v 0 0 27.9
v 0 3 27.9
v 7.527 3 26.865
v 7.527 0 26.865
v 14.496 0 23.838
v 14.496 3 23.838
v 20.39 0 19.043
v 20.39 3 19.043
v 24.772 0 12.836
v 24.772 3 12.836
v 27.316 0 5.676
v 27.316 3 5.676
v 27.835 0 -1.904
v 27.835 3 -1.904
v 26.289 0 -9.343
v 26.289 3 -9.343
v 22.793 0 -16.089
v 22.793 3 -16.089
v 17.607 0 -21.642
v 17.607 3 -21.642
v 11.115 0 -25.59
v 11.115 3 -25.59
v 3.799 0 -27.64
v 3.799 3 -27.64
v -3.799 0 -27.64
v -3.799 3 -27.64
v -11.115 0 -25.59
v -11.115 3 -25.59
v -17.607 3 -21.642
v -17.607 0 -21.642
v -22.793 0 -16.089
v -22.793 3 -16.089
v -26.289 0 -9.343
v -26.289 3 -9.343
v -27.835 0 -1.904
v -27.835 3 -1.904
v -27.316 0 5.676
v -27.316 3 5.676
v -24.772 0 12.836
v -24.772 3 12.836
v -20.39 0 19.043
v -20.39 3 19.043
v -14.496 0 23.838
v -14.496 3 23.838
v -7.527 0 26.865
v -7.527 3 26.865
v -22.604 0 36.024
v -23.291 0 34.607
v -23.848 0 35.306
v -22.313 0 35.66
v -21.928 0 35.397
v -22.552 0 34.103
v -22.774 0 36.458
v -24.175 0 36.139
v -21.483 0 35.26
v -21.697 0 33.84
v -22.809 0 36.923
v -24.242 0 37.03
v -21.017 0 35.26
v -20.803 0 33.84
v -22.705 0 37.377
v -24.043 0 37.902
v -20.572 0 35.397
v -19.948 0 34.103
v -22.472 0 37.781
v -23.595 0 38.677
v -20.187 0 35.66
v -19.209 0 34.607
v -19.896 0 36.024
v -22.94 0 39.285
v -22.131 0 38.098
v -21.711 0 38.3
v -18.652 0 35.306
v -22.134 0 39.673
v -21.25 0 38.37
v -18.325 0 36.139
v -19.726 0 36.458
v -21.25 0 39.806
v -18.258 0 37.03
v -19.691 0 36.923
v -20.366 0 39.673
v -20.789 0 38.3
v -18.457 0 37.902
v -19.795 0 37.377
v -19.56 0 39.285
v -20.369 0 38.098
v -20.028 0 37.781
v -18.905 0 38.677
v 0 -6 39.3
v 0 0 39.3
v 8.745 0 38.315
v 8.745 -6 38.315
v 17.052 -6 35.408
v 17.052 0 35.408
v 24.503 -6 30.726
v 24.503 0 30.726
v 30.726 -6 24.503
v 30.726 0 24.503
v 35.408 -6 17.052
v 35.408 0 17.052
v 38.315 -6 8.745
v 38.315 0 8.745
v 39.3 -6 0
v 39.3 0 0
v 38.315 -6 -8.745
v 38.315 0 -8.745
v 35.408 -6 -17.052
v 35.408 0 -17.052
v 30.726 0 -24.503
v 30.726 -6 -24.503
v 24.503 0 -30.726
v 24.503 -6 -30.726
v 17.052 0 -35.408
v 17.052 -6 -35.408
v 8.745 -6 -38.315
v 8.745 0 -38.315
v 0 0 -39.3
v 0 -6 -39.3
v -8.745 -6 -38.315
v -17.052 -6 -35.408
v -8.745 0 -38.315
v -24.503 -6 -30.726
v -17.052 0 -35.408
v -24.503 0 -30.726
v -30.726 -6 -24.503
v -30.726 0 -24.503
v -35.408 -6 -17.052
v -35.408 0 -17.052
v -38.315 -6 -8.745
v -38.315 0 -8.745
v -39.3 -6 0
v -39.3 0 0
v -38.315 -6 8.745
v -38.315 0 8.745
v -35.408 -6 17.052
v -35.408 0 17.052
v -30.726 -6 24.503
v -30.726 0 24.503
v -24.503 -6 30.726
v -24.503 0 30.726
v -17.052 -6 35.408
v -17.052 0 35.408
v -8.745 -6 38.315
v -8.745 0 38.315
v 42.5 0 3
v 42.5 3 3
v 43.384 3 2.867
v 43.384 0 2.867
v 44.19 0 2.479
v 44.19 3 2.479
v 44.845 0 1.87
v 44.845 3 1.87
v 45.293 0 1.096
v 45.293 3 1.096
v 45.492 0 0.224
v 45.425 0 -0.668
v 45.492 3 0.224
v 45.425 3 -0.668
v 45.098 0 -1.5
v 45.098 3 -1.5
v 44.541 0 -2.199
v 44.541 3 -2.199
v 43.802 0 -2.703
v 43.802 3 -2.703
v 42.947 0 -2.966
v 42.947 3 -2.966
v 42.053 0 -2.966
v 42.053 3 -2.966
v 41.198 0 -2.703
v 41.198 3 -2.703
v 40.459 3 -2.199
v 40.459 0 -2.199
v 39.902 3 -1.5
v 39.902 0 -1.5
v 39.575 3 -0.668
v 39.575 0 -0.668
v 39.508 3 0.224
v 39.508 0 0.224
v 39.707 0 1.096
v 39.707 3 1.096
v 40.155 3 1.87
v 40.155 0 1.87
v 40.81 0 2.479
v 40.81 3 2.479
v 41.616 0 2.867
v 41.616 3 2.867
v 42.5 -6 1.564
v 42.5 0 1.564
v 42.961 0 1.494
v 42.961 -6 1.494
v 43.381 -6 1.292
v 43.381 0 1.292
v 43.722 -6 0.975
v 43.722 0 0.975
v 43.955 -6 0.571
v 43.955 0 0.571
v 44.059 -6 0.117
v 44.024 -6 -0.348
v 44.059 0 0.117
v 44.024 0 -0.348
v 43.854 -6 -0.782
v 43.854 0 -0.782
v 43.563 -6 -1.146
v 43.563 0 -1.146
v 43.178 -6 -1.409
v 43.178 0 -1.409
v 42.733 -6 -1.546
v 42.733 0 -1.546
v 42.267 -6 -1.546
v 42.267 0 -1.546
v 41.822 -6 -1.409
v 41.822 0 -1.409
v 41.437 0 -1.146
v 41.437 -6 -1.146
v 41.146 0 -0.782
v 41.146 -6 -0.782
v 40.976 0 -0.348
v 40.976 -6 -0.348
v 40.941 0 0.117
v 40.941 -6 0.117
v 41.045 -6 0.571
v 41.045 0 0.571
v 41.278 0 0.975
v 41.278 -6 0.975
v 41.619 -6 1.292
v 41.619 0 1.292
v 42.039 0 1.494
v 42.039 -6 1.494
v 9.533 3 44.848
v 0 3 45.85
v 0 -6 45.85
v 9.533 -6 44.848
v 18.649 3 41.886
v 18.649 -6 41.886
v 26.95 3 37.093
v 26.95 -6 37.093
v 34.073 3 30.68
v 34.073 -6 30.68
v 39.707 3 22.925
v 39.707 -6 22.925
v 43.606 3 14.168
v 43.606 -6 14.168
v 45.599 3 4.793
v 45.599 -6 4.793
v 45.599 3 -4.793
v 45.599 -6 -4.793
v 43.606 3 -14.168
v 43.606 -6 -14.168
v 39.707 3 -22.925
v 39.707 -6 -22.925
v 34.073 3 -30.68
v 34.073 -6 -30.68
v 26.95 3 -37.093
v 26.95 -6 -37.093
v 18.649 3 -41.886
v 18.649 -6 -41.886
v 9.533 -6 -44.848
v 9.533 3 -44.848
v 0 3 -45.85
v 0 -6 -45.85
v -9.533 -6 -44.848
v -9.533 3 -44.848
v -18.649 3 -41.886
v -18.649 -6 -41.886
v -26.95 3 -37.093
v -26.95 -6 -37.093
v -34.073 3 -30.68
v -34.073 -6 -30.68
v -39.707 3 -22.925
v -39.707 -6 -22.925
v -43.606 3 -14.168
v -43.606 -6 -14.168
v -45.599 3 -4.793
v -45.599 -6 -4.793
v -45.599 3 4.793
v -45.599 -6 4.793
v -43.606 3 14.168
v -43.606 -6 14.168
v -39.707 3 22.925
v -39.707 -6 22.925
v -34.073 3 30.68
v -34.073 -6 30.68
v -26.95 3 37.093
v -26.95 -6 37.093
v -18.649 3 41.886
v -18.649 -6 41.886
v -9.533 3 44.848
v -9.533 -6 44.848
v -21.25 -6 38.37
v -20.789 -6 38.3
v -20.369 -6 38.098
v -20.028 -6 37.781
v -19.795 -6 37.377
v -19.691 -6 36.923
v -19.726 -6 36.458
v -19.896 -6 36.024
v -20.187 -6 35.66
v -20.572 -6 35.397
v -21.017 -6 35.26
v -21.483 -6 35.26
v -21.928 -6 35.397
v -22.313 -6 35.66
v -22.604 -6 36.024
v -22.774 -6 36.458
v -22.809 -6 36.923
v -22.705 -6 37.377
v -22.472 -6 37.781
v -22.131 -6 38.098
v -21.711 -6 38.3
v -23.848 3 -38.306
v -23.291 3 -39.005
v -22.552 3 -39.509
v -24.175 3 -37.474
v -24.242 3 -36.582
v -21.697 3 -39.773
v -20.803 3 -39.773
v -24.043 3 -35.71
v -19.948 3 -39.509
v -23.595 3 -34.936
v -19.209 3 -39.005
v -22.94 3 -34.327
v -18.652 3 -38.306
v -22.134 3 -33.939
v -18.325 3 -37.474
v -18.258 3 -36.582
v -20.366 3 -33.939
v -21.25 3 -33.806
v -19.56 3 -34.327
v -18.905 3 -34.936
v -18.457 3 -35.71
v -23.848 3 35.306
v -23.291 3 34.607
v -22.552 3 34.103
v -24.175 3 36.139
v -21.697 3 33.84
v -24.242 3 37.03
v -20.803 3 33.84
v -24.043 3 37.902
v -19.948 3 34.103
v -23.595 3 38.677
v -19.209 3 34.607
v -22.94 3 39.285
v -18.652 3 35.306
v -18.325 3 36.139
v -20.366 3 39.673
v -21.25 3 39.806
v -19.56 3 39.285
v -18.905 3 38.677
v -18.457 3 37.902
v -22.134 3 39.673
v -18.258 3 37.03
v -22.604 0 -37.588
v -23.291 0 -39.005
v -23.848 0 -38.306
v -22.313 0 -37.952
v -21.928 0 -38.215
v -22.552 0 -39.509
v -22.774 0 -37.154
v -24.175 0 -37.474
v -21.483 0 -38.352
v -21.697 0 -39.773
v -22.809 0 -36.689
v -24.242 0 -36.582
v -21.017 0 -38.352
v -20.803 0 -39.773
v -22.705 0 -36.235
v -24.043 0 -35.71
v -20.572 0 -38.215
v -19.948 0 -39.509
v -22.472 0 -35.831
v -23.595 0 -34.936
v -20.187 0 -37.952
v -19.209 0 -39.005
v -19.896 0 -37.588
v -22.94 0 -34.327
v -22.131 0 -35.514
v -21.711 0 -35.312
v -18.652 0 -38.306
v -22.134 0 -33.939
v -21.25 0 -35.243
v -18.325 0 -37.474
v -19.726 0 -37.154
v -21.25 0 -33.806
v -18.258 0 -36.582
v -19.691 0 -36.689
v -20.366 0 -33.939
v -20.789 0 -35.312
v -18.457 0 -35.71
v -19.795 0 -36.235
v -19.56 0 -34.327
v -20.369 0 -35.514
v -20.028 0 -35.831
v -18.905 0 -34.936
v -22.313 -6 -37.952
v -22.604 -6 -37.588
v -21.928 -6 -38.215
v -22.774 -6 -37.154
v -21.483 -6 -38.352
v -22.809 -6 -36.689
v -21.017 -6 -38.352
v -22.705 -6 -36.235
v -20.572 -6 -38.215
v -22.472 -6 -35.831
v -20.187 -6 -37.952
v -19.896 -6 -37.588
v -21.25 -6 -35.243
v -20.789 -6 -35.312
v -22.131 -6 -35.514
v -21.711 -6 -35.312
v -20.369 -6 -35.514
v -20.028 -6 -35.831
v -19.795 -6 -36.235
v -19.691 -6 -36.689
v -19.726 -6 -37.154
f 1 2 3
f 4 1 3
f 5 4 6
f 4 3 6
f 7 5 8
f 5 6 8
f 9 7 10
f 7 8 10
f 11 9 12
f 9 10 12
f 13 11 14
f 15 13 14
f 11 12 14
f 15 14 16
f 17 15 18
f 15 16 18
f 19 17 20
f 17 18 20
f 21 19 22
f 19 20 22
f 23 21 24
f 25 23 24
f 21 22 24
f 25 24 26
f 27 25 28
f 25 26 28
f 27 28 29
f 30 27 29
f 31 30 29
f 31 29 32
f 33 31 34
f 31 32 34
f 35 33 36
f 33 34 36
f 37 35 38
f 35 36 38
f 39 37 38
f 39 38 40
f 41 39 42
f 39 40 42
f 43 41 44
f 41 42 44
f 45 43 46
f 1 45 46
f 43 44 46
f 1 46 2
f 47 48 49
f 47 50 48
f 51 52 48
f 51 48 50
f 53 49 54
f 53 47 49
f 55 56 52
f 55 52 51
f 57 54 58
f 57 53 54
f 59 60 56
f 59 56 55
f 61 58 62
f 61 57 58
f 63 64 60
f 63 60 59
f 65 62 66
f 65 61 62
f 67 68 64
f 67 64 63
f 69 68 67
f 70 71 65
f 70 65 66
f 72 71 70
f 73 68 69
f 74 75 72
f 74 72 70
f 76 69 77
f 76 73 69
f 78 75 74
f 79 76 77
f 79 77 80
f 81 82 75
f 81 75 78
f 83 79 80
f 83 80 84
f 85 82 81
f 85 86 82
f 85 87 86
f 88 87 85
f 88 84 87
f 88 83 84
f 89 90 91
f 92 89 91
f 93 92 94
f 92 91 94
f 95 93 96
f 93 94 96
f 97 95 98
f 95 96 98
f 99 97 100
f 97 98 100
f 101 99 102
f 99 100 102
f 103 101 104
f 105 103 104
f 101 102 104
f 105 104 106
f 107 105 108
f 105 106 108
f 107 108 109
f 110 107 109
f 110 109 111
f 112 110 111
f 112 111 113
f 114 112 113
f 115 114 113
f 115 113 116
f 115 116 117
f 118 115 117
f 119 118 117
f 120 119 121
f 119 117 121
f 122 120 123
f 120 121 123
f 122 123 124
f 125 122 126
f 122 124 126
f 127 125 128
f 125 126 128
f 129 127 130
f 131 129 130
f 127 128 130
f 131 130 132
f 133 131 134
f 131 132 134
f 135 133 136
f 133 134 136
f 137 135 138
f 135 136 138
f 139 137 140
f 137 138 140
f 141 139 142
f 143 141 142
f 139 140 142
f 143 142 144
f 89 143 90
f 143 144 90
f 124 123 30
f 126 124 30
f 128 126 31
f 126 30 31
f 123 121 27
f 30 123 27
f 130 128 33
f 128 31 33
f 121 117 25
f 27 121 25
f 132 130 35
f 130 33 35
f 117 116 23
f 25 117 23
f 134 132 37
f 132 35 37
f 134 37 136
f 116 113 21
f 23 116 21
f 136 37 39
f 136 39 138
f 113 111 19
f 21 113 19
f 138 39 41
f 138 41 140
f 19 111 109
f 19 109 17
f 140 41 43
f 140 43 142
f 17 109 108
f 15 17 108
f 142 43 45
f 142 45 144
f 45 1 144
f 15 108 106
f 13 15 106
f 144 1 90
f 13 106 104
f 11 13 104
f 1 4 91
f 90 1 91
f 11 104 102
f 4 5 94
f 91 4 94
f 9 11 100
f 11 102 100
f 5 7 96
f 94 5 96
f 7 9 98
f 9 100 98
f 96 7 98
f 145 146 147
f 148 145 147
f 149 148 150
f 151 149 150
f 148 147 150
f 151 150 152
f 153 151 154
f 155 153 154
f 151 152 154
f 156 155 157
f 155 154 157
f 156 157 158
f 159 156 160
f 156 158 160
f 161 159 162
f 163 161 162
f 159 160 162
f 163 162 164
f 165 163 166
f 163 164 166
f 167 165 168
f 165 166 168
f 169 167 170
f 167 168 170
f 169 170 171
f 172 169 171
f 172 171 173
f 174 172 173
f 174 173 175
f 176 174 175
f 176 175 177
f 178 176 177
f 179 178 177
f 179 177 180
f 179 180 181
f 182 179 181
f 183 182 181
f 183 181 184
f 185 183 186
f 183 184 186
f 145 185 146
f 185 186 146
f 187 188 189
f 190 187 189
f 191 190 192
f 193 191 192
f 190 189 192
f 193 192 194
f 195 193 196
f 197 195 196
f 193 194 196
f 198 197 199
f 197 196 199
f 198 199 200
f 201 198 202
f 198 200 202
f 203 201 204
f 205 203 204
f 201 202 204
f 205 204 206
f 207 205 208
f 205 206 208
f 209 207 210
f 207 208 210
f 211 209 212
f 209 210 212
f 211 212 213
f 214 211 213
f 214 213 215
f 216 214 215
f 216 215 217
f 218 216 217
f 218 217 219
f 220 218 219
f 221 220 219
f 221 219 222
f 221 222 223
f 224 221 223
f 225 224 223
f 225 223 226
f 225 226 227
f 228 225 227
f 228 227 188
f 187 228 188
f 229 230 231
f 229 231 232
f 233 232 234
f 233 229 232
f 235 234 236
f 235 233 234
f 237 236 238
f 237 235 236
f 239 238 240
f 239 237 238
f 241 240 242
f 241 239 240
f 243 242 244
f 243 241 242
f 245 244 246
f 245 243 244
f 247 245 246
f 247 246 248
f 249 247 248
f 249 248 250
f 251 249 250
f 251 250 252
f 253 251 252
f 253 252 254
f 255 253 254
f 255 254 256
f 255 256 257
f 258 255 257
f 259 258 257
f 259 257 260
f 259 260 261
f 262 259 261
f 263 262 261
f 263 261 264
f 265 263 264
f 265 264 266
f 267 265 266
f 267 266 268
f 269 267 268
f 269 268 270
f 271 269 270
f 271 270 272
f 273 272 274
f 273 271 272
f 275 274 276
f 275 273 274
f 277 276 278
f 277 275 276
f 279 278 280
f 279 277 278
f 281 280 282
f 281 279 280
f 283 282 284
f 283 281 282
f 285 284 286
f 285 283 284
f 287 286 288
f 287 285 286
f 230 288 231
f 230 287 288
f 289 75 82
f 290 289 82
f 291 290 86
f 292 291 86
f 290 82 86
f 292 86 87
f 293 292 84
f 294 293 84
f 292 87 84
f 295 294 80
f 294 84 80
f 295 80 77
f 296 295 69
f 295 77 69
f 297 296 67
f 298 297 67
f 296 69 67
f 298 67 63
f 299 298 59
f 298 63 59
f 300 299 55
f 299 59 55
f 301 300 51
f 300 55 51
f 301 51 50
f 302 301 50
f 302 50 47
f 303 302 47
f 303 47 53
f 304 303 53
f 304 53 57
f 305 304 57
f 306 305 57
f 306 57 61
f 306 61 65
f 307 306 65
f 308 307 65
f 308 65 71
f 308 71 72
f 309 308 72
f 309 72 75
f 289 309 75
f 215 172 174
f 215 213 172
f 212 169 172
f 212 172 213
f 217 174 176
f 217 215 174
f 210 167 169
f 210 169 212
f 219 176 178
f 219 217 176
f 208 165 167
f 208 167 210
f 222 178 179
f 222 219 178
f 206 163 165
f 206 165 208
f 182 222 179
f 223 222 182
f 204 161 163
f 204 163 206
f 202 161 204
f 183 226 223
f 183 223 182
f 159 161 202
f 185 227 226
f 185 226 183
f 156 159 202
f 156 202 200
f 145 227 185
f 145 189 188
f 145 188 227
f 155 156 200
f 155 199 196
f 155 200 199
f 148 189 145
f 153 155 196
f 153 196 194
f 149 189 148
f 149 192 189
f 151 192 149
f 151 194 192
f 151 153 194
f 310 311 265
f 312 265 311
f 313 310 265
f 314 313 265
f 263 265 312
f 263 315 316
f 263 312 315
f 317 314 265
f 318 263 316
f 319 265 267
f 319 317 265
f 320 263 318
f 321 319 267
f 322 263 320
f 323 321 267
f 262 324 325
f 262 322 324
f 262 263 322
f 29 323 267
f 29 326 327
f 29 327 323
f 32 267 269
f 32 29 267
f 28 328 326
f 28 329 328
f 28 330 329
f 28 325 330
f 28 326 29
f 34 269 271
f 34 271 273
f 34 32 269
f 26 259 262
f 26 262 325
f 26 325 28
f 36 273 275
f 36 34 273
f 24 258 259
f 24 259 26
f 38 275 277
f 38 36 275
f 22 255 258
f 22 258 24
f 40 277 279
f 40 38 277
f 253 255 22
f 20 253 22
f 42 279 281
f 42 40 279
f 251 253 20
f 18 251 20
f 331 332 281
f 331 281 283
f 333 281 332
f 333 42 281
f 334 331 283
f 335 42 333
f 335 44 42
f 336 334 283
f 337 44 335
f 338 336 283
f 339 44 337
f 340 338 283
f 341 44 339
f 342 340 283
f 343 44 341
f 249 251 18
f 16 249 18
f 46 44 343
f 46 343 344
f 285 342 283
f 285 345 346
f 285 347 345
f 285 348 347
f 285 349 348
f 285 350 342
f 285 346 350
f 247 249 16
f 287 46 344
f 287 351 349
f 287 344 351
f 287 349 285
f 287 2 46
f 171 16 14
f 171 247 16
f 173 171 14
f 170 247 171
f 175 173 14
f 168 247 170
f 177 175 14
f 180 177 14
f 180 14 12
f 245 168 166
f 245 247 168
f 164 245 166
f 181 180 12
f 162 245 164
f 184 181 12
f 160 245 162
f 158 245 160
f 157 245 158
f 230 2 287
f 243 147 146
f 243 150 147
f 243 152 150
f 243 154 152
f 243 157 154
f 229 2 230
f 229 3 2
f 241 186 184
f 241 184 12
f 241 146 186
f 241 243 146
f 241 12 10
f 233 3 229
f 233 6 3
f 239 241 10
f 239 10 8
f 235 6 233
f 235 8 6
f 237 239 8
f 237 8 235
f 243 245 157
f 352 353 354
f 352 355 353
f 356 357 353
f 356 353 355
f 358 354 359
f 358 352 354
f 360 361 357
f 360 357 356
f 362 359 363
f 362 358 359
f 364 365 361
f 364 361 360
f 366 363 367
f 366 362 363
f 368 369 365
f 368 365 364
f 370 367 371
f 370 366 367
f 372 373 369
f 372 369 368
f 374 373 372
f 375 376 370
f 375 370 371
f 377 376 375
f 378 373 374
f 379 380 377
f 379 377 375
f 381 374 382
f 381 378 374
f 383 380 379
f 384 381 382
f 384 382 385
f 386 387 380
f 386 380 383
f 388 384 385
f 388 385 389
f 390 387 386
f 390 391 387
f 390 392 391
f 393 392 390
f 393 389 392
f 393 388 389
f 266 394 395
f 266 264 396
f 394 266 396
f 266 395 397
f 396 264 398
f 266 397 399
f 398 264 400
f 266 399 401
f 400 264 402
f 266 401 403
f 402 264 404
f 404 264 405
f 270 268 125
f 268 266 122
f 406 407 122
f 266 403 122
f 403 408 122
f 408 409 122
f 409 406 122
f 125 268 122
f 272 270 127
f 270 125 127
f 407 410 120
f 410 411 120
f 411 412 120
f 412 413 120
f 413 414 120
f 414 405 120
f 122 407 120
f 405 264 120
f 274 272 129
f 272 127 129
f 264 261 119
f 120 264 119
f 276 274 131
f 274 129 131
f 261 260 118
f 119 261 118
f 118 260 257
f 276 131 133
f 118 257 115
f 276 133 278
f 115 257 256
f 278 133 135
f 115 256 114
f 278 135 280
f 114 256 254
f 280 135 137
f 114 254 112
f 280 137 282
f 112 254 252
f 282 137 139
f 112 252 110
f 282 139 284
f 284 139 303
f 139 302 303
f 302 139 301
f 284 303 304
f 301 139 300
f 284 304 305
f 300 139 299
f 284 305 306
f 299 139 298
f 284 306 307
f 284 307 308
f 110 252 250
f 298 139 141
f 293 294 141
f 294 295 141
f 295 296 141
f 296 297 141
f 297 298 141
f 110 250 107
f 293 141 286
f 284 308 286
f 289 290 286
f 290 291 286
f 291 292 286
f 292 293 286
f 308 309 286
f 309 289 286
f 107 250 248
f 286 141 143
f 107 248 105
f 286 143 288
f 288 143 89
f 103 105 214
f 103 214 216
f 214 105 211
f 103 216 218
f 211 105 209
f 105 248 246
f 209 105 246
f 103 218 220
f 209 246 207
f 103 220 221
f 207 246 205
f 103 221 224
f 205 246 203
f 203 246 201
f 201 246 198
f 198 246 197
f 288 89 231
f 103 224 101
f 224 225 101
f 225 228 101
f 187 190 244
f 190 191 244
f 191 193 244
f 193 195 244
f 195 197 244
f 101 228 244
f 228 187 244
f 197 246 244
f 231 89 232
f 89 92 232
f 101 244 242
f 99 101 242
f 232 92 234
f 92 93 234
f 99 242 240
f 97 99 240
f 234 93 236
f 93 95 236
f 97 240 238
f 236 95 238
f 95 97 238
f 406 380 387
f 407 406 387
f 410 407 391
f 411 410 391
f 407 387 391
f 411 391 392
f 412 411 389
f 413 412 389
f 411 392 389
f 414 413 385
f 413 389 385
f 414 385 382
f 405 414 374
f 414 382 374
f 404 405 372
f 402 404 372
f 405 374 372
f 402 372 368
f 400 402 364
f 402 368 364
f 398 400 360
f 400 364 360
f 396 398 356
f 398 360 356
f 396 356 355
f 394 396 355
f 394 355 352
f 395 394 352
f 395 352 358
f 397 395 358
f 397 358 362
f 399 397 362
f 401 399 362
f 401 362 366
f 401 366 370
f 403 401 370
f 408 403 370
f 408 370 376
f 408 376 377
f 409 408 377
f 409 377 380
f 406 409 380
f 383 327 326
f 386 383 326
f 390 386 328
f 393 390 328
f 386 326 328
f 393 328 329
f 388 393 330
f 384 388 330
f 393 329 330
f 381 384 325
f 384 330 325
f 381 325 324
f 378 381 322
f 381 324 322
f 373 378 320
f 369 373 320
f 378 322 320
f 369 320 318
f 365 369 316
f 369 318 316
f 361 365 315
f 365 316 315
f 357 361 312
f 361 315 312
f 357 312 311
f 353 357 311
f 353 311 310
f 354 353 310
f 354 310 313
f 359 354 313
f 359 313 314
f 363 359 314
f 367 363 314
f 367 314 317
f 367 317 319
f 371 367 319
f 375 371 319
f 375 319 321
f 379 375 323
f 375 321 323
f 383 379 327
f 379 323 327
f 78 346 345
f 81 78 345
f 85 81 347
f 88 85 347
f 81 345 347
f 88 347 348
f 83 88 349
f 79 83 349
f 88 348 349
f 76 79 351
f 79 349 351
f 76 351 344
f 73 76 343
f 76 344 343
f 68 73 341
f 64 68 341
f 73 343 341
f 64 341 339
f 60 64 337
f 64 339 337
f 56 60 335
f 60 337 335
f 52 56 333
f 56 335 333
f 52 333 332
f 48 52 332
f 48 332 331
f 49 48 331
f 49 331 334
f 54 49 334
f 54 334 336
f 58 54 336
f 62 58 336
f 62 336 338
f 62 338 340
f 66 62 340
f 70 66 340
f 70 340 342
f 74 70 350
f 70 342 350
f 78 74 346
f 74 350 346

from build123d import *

# Parameters (mm, degrees)
SKETCH1_R           = 45.85
SKETCH1_R_2         = 1.5635
SKETCH1_R_3         = 39.3
BOSS_EXTRUDE1_DEPTH = 6
BOSS_EXTRUDE2_START = 3
SKETCH1_4_R         = 45.85
SKETCH1_4_R_2       = 1.5635
SKETCH1_4_R_3       = 27.9
BOSS_EXTRUDE2_DEPTH = 3
SKETCH2_R           = 3
CUT_EXTRUDE1_DEPTH  = 3


with BuildPart() as part:
    # Sketch1 → Boss-Extrude1 (new body)
    with BuildSketch(Plane(origin=(0, 0, 0), x_dir=(1, 0, 0), z_dir=(0, 1, 0))):
        Circle(SKETCH1_R)
        with Locations((-21.25, -36.806079661)):
            Circle(SKETCH1_R_2, mode=Mode.SUBTRACT)
        with Locations((-21.25, 36.806079661)):
            Circle(SKETCH1_R_2, mode=Mode.SUBTRACT)
        Circle(SKETCH1_R_3, mode=Mode.SUBTRACT)
        with Locations((42.5, 0)):
            Circle(SKETCH1_R_2, mode=Mode.SUBTRACT)
    extrude(amount=-BOSS_EXTRUDE1_DEPTH)

    # Sketch1<4> → Boss-Extrude2 (add)
    with BuildSketch(Plane(origin=(0, 0, 0), x_dir=(1, 0, 0), z_dir=(0, 1, 0)).offset(BOSS_EXTRUDE2_START)):
        Circle(SKETCH1_4_R)
        with Locations((-21.25, -36.806079661)):
            Circle(SKETCH1_4_R_2, mode=Mode.SUBTRACT)
        with Locations((-21.25, 36.806079661)):
            Circle(SKETCH1_4_R_2, mode=Mode.SUBTRACT)
        with Locations((42.5, 0)):
            Circle(SKETCH1_4_R_2, mode=Mode.SUBTRACT)
        Circle(SKETCH1_4_R_3, mode=Mode.SUBTRACT)
    extrude(amount=-BOSS_EXTRUDE2_DEPTH)

    # Sketch2 → Cut-Extrude1 (cut)
    with BuildSketch(Plane(origin=(0, 3, 0), x_dir=(1, 0, 0), z_dir=(0, 1, 0))):
        with Locations((42.5, 0)):
            Circle(SKETCH2_R)
        with Locations((-21.25, -36.806079661)):
            Circle(SKETCH2_R)
        with Locations((-21.25, 36.806079661)):
            Circle(SKETCH2_R)
    extrude(amount=-CUT_EXTRUDE1_DEPTH, mode=Mode.SUBTRACT)


solid = part.part
